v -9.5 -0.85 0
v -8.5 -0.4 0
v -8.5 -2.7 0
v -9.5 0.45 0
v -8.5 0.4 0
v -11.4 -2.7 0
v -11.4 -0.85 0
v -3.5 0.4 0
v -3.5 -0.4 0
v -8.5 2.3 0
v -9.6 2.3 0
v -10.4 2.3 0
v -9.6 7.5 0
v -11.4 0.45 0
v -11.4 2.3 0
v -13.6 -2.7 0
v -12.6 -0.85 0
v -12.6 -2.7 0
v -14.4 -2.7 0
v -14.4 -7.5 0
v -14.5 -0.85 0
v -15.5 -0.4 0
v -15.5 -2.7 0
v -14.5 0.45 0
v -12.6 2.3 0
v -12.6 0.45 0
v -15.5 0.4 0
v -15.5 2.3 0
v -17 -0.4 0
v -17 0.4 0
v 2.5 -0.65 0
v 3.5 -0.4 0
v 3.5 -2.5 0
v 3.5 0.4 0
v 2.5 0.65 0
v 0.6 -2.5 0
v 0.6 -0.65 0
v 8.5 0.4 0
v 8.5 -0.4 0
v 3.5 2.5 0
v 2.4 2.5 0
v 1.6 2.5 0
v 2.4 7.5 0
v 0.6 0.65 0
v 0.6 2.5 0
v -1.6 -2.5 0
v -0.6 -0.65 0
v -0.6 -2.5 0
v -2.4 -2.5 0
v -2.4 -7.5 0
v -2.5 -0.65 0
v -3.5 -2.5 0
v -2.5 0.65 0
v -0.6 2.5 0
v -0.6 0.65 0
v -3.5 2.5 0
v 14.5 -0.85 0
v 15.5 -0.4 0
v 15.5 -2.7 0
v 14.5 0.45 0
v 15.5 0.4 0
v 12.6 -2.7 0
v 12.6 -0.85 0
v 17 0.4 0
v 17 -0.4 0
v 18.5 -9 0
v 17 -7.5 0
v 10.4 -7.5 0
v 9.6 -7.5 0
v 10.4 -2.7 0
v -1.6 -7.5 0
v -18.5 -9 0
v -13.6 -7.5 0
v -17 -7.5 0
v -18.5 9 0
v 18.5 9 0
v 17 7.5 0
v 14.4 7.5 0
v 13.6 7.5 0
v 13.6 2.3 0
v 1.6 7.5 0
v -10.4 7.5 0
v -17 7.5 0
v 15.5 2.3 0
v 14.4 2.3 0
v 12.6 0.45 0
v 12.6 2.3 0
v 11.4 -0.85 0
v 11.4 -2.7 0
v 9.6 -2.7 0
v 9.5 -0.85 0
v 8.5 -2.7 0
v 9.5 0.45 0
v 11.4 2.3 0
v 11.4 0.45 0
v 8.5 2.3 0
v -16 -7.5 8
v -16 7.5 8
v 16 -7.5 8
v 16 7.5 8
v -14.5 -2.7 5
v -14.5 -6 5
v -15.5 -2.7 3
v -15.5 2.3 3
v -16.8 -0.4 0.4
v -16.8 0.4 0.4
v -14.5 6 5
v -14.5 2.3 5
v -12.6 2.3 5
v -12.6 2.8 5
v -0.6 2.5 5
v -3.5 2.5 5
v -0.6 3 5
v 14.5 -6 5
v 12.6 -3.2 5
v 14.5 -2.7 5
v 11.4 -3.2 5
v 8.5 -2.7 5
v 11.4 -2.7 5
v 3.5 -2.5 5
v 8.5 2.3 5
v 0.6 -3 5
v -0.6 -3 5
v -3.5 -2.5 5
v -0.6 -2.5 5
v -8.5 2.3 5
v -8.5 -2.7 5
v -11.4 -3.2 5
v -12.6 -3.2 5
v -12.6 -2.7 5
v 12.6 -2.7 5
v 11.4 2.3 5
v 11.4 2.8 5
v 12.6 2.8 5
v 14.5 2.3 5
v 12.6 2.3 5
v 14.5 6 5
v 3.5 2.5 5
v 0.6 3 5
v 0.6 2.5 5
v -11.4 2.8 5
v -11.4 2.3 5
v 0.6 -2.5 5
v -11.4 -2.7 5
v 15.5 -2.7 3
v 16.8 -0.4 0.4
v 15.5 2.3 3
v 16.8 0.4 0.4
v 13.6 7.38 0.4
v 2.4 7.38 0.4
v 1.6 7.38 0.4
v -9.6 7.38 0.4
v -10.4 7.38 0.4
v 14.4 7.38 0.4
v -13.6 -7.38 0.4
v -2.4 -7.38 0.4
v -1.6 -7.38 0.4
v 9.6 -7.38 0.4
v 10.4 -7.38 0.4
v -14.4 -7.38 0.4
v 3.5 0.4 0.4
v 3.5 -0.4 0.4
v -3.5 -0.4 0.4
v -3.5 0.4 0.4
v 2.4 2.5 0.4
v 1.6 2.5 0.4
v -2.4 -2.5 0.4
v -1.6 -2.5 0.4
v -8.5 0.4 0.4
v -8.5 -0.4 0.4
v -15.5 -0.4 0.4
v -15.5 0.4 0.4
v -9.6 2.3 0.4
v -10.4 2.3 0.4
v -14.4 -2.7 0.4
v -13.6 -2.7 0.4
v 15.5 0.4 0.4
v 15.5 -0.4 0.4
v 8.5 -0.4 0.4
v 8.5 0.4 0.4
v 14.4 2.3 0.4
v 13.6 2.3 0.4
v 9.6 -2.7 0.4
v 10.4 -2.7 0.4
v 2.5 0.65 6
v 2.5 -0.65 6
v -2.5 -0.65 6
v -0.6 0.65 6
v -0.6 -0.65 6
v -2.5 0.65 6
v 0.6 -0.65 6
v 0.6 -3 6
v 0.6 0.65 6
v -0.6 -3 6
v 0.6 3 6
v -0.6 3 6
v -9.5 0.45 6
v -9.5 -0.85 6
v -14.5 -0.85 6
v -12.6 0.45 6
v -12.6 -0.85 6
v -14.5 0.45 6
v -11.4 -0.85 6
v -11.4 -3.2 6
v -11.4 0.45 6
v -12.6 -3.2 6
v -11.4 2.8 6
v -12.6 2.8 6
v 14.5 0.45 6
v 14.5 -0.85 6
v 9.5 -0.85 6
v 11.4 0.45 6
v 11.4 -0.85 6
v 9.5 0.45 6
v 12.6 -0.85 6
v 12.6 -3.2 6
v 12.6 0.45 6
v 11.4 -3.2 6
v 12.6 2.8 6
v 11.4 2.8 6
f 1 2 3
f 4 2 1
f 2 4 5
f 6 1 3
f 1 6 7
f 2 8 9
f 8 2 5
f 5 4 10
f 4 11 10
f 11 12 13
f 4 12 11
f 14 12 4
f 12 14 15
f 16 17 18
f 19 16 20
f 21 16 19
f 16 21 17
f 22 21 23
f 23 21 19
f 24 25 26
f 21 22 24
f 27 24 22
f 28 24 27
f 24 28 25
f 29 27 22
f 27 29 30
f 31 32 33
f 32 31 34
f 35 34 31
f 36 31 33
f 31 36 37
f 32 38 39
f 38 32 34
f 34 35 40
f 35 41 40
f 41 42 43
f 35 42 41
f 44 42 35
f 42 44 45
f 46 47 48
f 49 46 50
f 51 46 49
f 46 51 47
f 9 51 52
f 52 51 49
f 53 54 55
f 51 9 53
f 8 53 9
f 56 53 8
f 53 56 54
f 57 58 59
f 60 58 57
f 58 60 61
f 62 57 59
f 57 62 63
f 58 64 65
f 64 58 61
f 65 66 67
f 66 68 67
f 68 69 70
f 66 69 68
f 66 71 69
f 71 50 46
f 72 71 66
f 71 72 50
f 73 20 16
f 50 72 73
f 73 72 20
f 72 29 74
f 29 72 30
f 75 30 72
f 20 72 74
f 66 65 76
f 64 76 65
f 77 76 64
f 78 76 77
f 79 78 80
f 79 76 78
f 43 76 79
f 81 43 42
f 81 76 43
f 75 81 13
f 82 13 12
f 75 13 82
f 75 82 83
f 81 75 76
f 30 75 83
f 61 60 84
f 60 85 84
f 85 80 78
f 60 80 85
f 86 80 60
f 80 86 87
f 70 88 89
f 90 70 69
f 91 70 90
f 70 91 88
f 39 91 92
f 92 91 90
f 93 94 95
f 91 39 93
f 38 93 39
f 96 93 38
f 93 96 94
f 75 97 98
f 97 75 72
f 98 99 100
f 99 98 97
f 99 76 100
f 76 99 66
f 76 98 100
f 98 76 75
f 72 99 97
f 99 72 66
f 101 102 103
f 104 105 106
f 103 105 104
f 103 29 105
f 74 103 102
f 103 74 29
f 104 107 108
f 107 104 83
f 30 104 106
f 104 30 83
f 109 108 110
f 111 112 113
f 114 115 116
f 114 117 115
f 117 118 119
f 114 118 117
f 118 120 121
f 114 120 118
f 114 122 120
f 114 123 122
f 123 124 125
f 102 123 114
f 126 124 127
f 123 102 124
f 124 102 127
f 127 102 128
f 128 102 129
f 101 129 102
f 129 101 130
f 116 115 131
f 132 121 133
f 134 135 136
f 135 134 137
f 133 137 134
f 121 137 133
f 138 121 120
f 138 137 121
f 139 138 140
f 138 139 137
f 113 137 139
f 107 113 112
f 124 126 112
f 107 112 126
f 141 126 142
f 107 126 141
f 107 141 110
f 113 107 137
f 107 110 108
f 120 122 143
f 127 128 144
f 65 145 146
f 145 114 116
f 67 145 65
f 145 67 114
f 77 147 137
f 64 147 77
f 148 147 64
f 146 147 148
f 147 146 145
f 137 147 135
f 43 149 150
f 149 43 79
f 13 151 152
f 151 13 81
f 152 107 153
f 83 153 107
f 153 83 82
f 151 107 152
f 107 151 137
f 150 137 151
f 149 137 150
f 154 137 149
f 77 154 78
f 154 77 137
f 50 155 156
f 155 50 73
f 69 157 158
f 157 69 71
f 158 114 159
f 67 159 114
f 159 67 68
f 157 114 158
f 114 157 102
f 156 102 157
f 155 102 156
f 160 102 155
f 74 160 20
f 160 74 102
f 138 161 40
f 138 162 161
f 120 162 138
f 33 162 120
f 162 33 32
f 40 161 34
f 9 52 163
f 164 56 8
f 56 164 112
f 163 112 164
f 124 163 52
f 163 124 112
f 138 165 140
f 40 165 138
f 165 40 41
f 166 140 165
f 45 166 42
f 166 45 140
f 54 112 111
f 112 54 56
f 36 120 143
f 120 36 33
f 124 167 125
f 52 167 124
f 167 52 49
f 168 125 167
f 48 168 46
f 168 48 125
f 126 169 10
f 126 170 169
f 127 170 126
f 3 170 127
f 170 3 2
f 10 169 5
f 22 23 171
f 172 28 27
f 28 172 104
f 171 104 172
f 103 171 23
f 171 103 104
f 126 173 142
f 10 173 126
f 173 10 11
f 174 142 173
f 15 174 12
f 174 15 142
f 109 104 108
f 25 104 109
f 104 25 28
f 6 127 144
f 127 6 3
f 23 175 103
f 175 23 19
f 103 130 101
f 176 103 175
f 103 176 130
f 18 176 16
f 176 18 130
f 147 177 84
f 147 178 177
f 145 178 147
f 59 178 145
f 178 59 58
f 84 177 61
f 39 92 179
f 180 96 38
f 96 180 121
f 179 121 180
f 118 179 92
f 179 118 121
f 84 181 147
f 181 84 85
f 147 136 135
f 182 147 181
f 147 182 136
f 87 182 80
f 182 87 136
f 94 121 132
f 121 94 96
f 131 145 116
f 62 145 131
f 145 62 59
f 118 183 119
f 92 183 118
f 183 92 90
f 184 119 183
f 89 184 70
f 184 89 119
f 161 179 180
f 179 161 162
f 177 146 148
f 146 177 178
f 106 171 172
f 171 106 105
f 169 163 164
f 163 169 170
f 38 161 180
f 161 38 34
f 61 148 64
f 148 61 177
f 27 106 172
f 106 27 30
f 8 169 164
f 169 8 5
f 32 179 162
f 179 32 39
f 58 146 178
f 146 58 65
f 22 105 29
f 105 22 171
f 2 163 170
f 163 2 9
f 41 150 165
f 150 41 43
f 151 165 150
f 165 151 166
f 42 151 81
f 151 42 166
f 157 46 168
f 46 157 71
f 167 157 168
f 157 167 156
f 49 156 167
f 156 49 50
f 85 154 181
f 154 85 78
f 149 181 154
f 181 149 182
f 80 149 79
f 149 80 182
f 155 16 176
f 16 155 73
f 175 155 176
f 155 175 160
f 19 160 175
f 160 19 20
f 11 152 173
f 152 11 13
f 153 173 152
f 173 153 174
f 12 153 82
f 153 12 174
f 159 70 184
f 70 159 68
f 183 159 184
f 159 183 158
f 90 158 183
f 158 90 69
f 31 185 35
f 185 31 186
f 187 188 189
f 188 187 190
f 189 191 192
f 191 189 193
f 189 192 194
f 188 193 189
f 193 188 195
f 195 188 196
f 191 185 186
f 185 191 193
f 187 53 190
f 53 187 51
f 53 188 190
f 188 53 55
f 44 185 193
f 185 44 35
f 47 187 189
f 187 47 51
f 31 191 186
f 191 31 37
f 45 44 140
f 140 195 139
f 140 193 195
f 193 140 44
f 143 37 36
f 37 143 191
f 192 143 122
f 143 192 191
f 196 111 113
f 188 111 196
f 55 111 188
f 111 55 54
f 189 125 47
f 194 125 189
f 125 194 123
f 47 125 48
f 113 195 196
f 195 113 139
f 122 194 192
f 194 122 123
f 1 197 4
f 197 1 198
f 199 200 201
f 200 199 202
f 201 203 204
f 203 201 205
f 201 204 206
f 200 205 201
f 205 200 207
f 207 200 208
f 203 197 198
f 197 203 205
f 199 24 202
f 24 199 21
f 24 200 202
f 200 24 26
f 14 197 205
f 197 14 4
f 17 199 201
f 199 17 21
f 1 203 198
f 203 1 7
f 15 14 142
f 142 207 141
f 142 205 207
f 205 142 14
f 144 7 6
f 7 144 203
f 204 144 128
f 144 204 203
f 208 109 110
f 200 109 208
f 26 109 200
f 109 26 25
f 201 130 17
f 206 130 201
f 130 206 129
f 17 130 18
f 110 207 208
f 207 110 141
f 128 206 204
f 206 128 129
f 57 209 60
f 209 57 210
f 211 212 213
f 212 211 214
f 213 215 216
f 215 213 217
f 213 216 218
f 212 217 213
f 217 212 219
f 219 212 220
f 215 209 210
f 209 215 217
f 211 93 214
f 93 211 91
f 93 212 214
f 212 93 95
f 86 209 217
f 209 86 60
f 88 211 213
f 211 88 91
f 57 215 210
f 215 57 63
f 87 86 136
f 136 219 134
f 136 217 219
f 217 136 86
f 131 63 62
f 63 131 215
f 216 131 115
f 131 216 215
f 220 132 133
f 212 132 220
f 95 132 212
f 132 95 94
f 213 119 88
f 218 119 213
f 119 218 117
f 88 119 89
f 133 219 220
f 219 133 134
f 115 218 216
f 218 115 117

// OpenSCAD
key_height = 8;

bottom_x_size = 37;
bottom_y_size = 18;

top_x_size = 32;
top_y_size = 15;

difference() {
  union() {
    difference() {
      linear_extrude(height = key_height, scale = [top_x_size / bottom_x_size, top_y_size / bottom_y_size]) {
        square(size=[bottom_x_size, bottom_y_size], center=true);
      }
      linear_extrude(height = 5, scale = [(top_x_size-3)/(bottom_x_size-3), (top_y_size-3)/(bottom_y_size-3)]) {
        square(size=[bottom_x_size-3, bottom_y_size-3], center=true);
      }
    }
    translate([0, 0, 3]) cube([7, 5, 6], center=true);
    translate([-12, -0.2, 3]) cube([7, 5, 6], center=true);
    translate([12, -0.2, 3]) cube([7, 5, 6], center=true);

    translate([0, 0, 0.2]) cube([bottom_x_size-2, 0.8, 0.4], center=true);

    translate([2, (18-7)/2, 0.2]) cube([0.8, (18-5)/2, 0.4], center=true);
    translate([-2, -(18-7)/2, 0.2]) cube([0.8, (18-5)/2, 0.4], center=true);
    translate([14, (18-7)/2, 0.2]) cube([0.8, (18-5)/2, 0.4], center=true);
    translate([-14, -(18-7)/2, 0.2]) cube([0.8, (18-5)/2, 0.4], center=true);
    translate([-10, (18-7)/2, 0.2]) cube([0.8, (18-5)/2, 0.4], center=true);
    translate([10, -(18-7)/2, 0.2]) cube([0.8, (18-5)/2, 0.4], center=true);
  }
  translate([0, 0, 3]) {
    cube([5, 1.3, 6], center=true);
    cube([1.2, 6, 6], center=true);
  }
  for (offset=[-12, 12]) {
    translate([offset, -0.2, 3]) {
      cube([5, 1.3, 6], center=true);
      cube([1.2, 6, 6], center=true);
    }
  }
}
